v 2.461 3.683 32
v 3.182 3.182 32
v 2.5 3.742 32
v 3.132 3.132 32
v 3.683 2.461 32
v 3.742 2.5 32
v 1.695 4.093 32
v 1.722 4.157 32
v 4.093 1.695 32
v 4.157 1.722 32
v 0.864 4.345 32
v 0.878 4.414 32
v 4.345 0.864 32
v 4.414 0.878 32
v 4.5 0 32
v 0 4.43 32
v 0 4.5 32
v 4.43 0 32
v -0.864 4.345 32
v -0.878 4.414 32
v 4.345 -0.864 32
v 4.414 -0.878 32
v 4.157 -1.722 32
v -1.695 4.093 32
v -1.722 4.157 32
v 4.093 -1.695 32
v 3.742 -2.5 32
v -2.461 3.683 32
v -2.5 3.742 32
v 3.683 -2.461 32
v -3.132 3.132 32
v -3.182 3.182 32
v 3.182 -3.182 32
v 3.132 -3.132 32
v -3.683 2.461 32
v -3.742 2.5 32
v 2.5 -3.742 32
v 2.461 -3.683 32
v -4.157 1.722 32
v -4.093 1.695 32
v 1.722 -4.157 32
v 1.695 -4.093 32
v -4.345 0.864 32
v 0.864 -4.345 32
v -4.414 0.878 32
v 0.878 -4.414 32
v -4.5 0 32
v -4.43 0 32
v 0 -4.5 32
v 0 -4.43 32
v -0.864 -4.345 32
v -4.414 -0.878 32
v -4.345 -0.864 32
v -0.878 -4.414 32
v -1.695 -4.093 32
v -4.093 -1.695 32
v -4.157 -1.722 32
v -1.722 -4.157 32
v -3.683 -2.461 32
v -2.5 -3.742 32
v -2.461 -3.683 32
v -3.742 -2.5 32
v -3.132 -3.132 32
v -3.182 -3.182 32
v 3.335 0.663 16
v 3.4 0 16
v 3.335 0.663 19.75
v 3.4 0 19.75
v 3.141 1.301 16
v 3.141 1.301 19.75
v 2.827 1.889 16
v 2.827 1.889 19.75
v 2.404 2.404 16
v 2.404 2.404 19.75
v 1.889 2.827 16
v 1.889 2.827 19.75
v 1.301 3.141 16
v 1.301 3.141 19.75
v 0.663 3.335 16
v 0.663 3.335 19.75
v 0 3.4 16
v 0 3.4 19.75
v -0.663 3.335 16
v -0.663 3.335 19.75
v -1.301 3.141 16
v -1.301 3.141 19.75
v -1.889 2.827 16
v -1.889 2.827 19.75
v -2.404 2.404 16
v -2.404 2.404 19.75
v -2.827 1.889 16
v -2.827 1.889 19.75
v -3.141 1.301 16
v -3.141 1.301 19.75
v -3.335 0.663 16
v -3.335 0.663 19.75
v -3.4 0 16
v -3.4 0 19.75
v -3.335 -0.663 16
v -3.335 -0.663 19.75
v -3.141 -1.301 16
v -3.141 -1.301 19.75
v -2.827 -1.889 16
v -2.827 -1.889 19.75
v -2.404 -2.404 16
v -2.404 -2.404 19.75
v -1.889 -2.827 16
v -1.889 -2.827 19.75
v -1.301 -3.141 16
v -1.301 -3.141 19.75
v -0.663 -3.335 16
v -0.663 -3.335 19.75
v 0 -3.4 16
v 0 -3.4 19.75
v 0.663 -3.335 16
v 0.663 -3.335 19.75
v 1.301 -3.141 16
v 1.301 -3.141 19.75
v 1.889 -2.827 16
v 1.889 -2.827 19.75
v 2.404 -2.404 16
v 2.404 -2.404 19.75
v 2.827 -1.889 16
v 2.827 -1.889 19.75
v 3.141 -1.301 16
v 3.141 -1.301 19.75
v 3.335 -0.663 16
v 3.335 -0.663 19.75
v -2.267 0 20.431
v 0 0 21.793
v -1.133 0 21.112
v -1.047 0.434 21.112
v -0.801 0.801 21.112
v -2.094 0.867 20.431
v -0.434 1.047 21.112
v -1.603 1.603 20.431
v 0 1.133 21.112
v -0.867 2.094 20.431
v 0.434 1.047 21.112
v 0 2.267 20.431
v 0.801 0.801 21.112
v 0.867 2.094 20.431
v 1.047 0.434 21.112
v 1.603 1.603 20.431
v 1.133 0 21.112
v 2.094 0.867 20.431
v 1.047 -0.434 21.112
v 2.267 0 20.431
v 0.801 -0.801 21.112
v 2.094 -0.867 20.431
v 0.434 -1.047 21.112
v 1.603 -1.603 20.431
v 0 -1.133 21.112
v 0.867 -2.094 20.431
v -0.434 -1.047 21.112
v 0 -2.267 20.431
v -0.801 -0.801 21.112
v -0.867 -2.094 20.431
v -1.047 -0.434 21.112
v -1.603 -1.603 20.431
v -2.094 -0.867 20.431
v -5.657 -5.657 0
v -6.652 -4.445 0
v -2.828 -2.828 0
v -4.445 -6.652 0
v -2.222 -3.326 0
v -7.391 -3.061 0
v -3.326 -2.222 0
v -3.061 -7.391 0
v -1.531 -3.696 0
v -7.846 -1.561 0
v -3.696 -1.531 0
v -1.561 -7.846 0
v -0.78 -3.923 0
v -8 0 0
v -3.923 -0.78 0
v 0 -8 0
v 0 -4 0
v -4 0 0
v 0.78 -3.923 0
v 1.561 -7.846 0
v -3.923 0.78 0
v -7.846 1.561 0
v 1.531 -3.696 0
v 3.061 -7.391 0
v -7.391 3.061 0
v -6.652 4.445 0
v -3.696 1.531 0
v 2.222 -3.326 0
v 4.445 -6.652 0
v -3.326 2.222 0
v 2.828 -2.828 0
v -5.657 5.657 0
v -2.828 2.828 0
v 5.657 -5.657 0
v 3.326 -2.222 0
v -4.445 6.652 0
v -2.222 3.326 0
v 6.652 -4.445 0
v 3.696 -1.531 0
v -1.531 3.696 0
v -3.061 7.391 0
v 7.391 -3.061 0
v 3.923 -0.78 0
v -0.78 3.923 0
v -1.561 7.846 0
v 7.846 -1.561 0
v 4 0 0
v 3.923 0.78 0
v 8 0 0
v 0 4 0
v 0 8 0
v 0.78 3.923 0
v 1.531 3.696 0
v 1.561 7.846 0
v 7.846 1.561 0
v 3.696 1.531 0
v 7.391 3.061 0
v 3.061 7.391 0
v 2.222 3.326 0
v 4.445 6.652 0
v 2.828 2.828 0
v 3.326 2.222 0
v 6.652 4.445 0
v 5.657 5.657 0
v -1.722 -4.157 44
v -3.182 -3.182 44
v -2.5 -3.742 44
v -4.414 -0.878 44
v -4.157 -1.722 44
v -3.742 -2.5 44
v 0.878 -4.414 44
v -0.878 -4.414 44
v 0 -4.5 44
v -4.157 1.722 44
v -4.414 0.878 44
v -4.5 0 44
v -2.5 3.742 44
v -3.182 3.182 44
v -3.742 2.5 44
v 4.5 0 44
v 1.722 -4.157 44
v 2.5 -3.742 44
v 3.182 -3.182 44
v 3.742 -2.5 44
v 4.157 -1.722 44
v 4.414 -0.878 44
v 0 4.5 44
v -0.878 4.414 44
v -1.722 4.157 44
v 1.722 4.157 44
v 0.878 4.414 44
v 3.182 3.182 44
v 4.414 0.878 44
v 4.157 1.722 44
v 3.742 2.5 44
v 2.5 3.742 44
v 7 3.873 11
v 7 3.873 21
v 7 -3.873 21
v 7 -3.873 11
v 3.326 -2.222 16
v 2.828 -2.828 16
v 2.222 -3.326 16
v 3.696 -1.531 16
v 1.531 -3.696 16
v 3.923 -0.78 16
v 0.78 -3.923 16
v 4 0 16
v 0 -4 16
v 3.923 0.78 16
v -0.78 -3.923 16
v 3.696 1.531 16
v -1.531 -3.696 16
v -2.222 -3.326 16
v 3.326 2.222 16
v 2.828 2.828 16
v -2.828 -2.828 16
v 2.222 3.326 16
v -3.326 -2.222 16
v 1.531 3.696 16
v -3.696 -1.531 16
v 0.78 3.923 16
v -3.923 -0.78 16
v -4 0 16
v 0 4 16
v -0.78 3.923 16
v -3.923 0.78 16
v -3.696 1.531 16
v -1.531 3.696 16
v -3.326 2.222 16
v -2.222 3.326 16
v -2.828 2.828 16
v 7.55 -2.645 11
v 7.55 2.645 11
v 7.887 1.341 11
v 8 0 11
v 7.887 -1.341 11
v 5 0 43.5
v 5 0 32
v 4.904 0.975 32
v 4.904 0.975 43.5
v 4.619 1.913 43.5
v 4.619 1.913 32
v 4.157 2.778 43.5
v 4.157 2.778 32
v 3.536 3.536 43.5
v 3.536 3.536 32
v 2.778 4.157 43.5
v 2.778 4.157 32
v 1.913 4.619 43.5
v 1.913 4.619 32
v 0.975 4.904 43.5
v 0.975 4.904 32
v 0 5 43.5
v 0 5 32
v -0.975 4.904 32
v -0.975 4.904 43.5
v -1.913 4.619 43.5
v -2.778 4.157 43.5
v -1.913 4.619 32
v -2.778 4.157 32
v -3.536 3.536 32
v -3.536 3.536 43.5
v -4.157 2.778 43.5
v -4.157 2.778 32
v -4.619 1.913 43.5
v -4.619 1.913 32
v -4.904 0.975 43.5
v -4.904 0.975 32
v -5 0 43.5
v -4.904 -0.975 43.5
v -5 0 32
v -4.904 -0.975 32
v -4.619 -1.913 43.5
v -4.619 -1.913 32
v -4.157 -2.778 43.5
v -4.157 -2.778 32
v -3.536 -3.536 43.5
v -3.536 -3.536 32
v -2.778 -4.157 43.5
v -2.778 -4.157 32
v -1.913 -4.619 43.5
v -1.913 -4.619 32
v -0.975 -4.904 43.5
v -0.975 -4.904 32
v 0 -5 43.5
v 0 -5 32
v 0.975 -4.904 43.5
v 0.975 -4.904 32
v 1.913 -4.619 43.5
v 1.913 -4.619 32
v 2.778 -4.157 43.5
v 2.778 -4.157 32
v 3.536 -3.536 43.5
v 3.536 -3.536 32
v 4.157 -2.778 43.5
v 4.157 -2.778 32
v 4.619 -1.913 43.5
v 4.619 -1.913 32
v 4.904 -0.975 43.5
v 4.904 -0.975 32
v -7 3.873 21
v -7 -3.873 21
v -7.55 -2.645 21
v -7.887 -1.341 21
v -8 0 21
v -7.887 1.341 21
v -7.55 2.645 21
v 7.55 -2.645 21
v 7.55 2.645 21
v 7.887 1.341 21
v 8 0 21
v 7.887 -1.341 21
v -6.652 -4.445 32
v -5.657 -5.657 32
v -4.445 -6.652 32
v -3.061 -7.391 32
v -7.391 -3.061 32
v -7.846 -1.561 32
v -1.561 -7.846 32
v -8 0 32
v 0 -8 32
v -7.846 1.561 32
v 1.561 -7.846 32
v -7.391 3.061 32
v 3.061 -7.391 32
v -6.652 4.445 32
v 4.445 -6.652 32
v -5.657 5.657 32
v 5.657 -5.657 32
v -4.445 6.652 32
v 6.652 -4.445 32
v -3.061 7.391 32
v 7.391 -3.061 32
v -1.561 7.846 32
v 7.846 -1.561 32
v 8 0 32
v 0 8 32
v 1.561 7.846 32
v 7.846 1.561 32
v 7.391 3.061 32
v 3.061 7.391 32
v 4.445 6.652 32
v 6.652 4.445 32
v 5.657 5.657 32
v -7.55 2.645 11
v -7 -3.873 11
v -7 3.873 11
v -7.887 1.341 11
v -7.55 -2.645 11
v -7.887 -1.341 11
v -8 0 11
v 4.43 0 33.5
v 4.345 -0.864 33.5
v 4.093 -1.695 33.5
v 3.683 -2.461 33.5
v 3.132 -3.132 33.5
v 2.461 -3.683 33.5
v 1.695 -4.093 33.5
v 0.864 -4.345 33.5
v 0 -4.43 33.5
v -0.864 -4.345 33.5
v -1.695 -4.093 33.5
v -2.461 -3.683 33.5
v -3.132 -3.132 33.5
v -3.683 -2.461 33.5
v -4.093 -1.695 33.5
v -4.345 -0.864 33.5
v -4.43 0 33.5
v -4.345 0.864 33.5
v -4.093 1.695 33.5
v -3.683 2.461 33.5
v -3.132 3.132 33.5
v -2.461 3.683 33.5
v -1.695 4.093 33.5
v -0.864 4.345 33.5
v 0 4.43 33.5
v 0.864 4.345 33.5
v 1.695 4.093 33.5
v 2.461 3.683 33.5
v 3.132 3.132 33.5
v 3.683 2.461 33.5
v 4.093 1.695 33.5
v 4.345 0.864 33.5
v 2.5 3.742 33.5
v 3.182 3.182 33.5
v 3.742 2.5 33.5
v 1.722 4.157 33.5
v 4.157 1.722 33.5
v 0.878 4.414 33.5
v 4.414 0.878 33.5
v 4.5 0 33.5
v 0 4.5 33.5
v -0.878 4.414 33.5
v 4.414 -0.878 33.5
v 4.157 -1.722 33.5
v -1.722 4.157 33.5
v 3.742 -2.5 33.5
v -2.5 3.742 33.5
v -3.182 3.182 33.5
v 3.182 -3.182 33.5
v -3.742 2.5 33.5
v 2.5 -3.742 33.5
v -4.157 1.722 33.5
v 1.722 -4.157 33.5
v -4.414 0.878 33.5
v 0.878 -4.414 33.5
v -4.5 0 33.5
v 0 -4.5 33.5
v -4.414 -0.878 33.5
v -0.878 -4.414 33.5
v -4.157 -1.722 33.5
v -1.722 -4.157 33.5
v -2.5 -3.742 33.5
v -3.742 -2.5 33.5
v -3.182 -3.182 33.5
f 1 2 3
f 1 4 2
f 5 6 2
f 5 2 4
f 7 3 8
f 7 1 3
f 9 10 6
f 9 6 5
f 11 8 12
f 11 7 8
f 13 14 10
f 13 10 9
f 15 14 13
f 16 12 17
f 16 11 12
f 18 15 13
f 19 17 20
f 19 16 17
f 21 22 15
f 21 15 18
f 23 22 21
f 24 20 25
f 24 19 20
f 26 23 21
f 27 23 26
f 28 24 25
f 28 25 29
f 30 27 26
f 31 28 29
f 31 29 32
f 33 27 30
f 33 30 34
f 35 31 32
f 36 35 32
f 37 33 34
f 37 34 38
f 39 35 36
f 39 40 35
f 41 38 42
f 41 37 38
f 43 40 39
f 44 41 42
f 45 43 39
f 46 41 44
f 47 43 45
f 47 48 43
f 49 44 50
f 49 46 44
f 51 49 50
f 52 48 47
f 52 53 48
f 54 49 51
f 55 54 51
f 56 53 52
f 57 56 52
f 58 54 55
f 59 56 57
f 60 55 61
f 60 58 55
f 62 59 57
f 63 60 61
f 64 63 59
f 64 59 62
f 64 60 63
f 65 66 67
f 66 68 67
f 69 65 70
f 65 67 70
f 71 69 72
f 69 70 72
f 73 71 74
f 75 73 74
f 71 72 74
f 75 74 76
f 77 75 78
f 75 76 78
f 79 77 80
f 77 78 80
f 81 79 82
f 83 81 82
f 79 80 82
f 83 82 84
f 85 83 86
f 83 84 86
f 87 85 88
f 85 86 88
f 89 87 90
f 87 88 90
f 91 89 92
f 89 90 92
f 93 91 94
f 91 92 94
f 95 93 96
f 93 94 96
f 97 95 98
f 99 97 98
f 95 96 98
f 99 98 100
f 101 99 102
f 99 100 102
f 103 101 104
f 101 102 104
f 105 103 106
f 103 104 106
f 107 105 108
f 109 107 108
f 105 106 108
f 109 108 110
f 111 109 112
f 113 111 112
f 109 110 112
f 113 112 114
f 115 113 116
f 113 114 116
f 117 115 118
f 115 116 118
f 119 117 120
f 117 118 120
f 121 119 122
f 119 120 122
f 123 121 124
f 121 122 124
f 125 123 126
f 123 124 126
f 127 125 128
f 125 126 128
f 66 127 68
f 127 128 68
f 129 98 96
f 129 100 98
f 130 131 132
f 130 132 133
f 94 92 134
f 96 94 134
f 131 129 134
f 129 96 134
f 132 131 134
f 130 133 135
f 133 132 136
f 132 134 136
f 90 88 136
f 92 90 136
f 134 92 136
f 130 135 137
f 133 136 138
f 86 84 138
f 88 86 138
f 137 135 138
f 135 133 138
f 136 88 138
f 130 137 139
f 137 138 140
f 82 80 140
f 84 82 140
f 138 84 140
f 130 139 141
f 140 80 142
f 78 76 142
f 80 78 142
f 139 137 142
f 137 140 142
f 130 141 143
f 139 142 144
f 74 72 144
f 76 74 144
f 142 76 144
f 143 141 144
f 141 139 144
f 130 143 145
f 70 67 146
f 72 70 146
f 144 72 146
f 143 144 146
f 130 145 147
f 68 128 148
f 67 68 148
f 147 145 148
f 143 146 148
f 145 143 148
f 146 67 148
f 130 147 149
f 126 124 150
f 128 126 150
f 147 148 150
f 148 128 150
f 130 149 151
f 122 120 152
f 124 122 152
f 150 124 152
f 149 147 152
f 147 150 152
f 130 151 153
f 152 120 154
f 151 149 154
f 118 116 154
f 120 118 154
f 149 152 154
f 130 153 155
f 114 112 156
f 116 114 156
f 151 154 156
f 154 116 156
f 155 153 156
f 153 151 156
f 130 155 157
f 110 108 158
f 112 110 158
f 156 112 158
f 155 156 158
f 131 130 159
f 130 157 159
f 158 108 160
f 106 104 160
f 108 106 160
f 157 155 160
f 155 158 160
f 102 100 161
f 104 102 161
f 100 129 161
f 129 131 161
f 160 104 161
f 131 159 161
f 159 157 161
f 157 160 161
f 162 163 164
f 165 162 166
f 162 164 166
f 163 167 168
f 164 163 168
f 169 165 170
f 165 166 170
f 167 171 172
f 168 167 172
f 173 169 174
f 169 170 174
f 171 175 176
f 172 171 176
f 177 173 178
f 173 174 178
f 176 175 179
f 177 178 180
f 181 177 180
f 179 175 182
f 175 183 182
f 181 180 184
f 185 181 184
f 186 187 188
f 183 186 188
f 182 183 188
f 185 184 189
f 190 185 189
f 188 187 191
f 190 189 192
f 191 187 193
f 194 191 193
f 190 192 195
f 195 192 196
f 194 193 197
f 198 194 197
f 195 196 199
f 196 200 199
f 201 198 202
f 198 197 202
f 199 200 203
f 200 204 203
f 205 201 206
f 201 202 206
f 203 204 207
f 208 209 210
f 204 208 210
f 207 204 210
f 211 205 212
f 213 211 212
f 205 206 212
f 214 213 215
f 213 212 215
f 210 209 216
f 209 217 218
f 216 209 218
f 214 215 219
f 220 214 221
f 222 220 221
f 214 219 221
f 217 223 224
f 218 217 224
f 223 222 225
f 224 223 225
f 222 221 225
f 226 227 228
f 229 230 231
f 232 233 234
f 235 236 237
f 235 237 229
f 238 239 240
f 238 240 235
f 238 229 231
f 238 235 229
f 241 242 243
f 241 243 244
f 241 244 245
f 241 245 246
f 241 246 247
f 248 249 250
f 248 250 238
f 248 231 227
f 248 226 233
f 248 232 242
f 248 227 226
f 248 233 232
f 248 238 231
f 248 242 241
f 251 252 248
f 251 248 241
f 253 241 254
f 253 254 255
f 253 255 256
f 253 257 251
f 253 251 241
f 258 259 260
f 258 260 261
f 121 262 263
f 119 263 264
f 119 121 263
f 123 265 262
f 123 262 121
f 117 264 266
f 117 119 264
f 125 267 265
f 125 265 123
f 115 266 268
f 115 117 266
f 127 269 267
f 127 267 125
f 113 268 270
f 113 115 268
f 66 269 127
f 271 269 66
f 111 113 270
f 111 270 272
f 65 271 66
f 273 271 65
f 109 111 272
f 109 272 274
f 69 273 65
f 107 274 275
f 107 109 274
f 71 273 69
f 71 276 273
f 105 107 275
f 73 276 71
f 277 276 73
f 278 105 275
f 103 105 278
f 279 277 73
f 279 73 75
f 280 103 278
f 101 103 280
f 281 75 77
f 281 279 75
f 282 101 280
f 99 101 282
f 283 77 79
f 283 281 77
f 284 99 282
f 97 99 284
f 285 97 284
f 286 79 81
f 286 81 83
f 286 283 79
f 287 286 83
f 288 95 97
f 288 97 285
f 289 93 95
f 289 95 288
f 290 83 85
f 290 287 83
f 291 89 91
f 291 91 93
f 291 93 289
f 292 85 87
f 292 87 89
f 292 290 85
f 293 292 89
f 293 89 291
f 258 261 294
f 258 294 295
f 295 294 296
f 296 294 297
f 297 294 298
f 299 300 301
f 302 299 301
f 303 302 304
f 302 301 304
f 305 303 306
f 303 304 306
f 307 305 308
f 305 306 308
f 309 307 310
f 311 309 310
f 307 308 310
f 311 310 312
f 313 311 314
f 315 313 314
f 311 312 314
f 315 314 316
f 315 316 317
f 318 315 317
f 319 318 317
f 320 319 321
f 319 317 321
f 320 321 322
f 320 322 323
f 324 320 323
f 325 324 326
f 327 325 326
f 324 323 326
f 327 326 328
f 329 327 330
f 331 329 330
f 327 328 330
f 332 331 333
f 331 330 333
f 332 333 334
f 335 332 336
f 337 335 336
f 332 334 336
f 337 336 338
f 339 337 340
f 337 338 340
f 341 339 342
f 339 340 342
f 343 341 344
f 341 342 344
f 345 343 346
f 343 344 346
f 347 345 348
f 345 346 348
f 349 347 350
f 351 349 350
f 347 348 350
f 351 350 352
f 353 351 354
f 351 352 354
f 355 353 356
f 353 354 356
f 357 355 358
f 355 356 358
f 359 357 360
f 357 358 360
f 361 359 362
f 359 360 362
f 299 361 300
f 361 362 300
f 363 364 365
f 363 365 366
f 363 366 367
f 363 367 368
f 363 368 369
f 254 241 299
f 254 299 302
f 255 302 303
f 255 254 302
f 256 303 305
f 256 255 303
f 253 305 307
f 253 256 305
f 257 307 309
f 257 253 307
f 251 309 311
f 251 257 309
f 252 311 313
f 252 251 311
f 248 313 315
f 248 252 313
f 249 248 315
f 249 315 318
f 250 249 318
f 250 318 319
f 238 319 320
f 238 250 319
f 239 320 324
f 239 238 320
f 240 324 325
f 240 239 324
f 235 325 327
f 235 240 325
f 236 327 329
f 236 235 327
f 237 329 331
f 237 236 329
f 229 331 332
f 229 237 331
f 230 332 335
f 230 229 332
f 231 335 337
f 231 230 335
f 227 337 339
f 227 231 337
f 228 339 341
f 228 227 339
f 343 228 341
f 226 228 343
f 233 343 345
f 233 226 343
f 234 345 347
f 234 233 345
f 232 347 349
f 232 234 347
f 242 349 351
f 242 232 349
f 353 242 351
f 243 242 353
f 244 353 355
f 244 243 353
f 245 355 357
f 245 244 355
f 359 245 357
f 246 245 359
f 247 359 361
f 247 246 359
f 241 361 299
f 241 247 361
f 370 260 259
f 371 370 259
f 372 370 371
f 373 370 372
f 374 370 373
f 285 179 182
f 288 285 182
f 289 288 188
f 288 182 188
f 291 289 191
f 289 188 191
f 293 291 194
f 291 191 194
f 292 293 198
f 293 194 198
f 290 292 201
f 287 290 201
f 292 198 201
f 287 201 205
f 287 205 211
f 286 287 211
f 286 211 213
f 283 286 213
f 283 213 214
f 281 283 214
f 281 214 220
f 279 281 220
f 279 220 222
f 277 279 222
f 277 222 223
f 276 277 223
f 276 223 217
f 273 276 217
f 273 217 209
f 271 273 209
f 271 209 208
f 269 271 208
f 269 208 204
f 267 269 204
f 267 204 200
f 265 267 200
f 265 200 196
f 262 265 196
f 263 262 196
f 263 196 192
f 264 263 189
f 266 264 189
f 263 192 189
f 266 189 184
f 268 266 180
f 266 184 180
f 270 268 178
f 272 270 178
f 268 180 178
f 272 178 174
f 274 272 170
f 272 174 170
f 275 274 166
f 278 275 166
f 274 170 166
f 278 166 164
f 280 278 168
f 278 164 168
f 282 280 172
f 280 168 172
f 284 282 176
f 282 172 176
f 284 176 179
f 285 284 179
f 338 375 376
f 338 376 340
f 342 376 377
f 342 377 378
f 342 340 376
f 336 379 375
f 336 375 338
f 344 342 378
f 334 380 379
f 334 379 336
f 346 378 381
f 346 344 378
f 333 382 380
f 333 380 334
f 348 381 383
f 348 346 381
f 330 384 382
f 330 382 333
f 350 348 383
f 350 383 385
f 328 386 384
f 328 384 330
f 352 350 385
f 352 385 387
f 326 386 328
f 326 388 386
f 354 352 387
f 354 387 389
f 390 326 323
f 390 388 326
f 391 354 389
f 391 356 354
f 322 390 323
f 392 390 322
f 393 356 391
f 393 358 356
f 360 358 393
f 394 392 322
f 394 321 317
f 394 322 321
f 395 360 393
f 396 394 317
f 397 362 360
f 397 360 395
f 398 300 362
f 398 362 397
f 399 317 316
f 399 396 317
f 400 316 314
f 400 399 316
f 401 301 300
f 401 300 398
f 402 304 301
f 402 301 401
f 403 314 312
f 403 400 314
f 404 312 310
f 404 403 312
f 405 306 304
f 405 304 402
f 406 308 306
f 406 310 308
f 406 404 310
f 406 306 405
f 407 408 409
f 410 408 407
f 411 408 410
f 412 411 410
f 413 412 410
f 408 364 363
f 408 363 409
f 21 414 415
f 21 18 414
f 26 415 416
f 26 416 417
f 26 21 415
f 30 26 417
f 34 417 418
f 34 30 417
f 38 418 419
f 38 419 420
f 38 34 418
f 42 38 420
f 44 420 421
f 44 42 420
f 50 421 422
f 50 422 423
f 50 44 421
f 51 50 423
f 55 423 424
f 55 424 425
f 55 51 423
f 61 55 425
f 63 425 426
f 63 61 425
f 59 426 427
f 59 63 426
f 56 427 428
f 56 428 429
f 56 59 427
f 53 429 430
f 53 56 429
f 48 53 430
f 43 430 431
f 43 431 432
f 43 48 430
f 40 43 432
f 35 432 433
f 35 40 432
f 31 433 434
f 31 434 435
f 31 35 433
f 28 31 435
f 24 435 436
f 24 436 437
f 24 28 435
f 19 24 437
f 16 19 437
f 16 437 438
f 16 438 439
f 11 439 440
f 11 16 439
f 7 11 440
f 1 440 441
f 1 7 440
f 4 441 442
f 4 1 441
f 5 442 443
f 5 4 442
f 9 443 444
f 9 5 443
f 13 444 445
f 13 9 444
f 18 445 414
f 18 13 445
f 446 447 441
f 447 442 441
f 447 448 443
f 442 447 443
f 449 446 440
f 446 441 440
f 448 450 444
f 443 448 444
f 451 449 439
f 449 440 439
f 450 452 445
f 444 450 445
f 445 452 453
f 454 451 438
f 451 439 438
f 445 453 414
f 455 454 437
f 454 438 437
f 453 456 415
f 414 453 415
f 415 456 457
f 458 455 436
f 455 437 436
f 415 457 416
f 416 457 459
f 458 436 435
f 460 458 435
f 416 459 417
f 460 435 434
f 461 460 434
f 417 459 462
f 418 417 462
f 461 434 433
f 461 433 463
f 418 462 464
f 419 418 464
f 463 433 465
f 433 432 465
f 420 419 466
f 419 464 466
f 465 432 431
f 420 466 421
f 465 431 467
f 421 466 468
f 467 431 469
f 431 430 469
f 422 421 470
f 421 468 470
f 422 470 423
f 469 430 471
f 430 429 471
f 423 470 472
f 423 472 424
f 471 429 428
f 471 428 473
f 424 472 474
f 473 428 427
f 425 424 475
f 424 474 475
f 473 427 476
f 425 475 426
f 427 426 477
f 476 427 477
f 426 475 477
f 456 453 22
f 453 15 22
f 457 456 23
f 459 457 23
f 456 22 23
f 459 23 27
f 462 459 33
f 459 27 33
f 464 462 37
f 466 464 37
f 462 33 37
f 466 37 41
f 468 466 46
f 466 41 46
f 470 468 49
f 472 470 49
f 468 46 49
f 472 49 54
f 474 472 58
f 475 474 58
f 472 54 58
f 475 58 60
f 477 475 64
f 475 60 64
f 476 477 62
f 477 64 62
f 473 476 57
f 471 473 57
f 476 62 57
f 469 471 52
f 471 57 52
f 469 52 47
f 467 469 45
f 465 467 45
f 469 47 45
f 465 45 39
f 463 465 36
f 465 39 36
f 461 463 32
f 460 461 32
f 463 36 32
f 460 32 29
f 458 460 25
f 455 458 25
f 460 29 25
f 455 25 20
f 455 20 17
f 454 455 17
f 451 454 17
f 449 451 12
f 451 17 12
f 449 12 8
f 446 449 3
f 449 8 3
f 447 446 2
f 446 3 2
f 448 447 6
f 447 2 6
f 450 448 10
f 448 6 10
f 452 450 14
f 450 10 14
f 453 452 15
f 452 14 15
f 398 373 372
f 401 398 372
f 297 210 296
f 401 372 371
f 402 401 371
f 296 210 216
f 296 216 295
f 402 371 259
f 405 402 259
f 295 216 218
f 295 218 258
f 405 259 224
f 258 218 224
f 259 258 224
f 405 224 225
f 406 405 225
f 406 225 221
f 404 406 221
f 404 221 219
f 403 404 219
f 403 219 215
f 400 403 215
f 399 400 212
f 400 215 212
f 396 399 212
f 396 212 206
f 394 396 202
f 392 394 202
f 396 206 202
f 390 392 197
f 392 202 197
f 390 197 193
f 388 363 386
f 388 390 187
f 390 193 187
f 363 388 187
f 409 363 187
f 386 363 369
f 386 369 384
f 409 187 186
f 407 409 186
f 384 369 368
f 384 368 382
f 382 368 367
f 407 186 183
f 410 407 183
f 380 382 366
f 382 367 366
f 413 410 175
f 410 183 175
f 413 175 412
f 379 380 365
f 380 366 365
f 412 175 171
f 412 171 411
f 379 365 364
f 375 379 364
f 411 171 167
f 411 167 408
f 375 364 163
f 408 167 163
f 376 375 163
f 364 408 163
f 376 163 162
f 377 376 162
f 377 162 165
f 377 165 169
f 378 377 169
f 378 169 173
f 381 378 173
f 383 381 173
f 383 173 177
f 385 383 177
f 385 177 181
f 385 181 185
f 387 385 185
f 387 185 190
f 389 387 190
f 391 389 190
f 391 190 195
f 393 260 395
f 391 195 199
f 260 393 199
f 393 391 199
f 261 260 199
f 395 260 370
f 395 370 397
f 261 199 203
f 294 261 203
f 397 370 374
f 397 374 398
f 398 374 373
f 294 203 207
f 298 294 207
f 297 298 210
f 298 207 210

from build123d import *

# Parameters (mm, degrees)
SKETCH_1_R                   = 8
EXTRUDE_1_DEPTH              = 32
SKETCH_2_W                   = 1
SKETCH_2_H                   = 10
CUT_EXTRUDE_2_DEPTH          = 9.25
HOLE_WIZARD_M8_1_D           = 6.8
HOLE_WIZARD_M8_1_DEPTH       = 19.75
HOLE_WIZARD_M8_1_CBORE_D     = 8
HOLE_WIZARD_M8_1_CBORE_DEPTH = 16
HOLE_WIZARD_M8_1_TIP         = 2.042926105
SKETCH_4_R                   = 5
EXTRUDE_3_DEPTH              = 12
CHAMFER_1_SIZE               = 0.5
SKETCH_5_W                   = 1.5
SKETCH_5_H                   = 0.069985642


with BuildPart() as part:
    # 草图1 → 拉伸1 (new body)
    with BuildSketch(Plane.XY):
        Circle(SKETCH_1_R)
    extrude(amount=EXTRUDE_1_DEPTH)

    # 草图2 → 拉伸2 (cut, symmetric)
    with BuildSketch(Plane(origin=(0, 0, 0), x_dir=(1, 0, 0), z_dir=(0, 1, 0))):
        with Locations((-7.5, -16)):
            Rectangle(SKETCH_2_W, SKETCH_2_H)
        with Locations((7.5, -16)):
            Rectangle(SKETCH_2_W, SKETCH_2_H)
    extrude(amount=CUT_EXTRUDE_2_DEPTH, both=True, mode=Mode.SUBTRACT)

    # M8 螺纹孔1
    with Locations(Plane(origin=(0, 0, 0), x_dir=(-1, 0, 0), z_dir=(0, 0, -1))):
        with Locations((0, 0)):
            CounterBoreHole(HOLE_WIZARD_M8_1_D / 2, HOLE_WIZARD_M8_1_CBORE_D / 2, HOLE_WIZARD_M8_1_CBORE_DEPTH, depth=HOLE_WIZARD_M8_1_DEPTH)
            with Locations((0, 0, -(HOLE_WIZARD_M8_1_DEPTH + HOLE_WIZARD_M8_1_TIP / 2))):  # 118° drill point
                Cone(0, HOLE_WIZARD_M8_1_D / 2, HOLE_WIZARD_M8_1_TIP, mode=Mode.SUBTRACT)

    # 草图4 → 拉伸3 (add)
    with BuildSketch(Plane.XY.offset(32)):
        Circle(SKETCH_4_R)
    extrude(amount=EXTRUDE_3_DEPTH)

    # 倒角1
    chamfer_1_edges = [part.edges().sort_by_distance(p)[0] for p in [
        (-5, 0, 44),
    ]]
    chamfer(chamfer_1_edges, length=CHAMFER_1_SIZE)

    # 草图5 → 切除-旋转1 (revolve, cut)
    with BuildSketch(Plane(origin=(0, 0, 0), x_dir=(0, 0, -1), z_dir=(1, 0, 0)), mode=Mode.PRIVATE) as cut_revolve_1_sk:
        with Locations((-32.75, 4.465007179)):
            Rectangle(SKETCH_5_W, SKETCH_5_H)
    revolve(cut_revolve_1_sk.sketch.rotate(Axis((0, 0, 32), (0, 0, -1)), 90), axis=Axis((0, 0, 32), (0, 0, -1)), mode=Mode.SUBTRACT)


solid = part.part
